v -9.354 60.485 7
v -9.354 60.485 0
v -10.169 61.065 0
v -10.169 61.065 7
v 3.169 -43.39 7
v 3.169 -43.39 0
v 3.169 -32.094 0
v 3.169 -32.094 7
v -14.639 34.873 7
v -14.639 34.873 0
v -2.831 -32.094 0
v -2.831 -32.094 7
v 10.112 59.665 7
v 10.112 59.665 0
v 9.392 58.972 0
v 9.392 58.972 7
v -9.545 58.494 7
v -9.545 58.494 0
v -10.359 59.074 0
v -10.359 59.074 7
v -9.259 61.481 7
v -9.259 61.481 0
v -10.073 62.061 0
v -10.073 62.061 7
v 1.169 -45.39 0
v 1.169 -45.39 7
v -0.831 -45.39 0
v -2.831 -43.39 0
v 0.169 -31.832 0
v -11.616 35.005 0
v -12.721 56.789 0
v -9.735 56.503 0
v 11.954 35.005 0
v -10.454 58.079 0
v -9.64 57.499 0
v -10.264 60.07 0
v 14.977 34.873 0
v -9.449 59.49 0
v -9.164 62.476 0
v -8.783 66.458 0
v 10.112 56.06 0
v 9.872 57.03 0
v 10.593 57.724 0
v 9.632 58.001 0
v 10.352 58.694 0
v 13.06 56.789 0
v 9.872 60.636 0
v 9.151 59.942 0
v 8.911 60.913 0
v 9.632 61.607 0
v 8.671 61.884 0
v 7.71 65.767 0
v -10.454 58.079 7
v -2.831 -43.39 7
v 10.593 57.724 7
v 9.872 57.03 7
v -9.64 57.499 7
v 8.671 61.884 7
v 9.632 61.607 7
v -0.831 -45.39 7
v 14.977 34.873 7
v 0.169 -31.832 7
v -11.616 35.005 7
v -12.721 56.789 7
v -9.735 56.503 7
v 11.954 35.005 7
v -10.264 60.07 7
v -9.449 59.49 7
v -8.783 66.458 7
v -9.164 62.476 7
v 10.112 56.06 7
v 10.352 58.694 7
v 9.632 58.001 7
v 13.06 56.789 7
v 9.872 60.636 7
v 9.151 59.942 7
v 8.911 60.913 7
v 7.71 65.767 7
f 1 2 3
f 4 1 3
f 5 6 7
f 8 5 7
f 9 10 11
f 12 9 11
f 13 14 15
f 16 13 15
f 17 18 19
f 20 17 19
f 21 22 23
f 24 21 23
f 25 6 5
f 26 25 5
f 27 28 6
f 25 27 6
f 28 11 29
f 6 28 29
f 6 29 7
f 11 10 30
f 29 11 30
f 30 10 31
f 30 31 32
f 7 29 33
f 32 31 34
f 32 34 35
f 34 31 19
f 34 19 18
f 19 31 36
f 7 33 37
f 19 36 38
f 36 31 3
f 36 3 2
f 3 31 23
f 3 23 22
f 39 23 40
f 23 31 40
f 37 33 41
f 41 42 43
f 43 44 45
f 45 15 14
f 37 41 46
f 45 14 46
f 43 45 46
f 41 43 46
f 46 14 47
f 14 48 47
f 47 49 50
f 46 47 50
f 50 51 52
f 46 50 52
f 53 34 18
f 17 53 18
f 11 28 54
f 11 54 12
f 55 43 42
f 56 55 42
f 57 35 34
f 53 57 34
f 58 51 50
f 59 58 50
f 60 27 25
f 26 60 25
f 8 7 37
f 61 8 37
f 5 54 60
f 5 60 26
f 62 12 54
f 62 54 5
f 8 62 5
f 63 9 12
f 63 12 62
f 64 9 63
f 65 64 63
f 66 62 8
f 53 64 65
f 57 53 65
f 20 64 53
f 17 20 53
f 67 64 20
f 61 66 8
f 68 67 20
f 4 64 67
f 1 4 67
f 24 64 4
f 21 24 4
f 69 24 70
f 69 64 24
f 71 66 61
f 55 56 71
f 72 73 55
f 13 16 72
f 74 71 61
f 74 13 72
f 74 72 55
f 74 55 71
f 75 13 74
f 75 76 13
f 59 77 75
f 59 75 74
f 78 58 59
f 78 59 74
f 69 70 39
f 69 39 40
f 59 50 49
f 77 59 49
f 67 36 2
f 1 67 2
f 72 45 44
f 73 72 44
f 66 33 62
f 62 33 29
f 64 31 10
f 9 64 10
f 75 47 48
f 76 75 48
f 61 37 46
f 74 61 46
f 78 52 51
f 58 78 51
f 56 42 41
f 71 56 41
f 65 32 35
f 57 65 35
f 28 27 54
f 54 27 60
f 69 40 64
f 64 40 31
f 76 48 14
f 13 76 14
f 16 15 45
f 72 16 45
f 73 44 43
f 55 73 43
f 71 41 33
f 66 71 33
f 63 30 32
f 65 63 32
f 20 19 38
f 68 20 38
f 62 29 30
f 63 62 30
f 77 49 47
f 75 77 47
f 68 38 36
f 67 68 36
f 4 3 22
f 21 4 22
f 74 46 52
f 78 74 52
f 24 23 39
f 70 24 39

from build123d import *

# Parameters (mm, degrees)
F0_W     = 6
F0_H     = 13.295454
F1_DEPTH = 7
F2_SIZE  = 2


with BuildPart() as f1:
    # F0 (on Top) → F1 (new body)
    with BuildSketch(Plane.XY):
        Polygon((-8.782924, 66.457867), (-12.721482, 56.78893), (-9.735013, 56.503294), (-9.639804, 57.498751), (-10.454291, 58.078933), (-9.544595, 58.494208), (-10.359082, 59.07439), (-9.449386, 59.489666), (-10.263873, 60.069848), (-9.354177, 60.485123), (-10.168664, 61.065305), (-9.258968, 61.48058), (-10.073455, 62.060762), (-9.16376, 62.476038), align=None)
        Polygon((-14.638909, 34.872646), (-2.830833, -32.094281), (3.169167, -32.094281), (14.977244, 34.872646), (13.059817, 56.78893), (10.112168, 56.059576), (11.954237, 35.004634), (0.169167, -31.831815), (-11.615902, 35.004634), (-9.735013, 56.503294), (-12.721482, 56.78893), align=None)
        with Locations((0.169167, -38.742008)):
            Rectangle(F0_W, F0_H)
        Polygon((10.112168, 56.059576), (13.059817, 56.78893), (7.710246, 65.766829), (8.671014, 61.883928), (9.631783, 61.606578), (8.911207, 60.913202), (9.871976, 60.635852), (9.151399, 59.942477), (10.112168, 59.665127), (9.391591, 58.971752), (10.35236, 58.694402), (9.631783, 58.001026), (10.592552, 57.723676), (9.871976, 57.030301), align=None)
    extrude(amount=F1_DEPTH)

    # F2
    f2_edges = [f1.edges().sort_by_distance(p)[0] for p in [
        (-2.830833, -45.389735, 3.5),
        (3.169167, -45.389735, 3.5),
    ]]
    chamfer(f2_edges, length=F2_SIZE)


solid = f1.part
